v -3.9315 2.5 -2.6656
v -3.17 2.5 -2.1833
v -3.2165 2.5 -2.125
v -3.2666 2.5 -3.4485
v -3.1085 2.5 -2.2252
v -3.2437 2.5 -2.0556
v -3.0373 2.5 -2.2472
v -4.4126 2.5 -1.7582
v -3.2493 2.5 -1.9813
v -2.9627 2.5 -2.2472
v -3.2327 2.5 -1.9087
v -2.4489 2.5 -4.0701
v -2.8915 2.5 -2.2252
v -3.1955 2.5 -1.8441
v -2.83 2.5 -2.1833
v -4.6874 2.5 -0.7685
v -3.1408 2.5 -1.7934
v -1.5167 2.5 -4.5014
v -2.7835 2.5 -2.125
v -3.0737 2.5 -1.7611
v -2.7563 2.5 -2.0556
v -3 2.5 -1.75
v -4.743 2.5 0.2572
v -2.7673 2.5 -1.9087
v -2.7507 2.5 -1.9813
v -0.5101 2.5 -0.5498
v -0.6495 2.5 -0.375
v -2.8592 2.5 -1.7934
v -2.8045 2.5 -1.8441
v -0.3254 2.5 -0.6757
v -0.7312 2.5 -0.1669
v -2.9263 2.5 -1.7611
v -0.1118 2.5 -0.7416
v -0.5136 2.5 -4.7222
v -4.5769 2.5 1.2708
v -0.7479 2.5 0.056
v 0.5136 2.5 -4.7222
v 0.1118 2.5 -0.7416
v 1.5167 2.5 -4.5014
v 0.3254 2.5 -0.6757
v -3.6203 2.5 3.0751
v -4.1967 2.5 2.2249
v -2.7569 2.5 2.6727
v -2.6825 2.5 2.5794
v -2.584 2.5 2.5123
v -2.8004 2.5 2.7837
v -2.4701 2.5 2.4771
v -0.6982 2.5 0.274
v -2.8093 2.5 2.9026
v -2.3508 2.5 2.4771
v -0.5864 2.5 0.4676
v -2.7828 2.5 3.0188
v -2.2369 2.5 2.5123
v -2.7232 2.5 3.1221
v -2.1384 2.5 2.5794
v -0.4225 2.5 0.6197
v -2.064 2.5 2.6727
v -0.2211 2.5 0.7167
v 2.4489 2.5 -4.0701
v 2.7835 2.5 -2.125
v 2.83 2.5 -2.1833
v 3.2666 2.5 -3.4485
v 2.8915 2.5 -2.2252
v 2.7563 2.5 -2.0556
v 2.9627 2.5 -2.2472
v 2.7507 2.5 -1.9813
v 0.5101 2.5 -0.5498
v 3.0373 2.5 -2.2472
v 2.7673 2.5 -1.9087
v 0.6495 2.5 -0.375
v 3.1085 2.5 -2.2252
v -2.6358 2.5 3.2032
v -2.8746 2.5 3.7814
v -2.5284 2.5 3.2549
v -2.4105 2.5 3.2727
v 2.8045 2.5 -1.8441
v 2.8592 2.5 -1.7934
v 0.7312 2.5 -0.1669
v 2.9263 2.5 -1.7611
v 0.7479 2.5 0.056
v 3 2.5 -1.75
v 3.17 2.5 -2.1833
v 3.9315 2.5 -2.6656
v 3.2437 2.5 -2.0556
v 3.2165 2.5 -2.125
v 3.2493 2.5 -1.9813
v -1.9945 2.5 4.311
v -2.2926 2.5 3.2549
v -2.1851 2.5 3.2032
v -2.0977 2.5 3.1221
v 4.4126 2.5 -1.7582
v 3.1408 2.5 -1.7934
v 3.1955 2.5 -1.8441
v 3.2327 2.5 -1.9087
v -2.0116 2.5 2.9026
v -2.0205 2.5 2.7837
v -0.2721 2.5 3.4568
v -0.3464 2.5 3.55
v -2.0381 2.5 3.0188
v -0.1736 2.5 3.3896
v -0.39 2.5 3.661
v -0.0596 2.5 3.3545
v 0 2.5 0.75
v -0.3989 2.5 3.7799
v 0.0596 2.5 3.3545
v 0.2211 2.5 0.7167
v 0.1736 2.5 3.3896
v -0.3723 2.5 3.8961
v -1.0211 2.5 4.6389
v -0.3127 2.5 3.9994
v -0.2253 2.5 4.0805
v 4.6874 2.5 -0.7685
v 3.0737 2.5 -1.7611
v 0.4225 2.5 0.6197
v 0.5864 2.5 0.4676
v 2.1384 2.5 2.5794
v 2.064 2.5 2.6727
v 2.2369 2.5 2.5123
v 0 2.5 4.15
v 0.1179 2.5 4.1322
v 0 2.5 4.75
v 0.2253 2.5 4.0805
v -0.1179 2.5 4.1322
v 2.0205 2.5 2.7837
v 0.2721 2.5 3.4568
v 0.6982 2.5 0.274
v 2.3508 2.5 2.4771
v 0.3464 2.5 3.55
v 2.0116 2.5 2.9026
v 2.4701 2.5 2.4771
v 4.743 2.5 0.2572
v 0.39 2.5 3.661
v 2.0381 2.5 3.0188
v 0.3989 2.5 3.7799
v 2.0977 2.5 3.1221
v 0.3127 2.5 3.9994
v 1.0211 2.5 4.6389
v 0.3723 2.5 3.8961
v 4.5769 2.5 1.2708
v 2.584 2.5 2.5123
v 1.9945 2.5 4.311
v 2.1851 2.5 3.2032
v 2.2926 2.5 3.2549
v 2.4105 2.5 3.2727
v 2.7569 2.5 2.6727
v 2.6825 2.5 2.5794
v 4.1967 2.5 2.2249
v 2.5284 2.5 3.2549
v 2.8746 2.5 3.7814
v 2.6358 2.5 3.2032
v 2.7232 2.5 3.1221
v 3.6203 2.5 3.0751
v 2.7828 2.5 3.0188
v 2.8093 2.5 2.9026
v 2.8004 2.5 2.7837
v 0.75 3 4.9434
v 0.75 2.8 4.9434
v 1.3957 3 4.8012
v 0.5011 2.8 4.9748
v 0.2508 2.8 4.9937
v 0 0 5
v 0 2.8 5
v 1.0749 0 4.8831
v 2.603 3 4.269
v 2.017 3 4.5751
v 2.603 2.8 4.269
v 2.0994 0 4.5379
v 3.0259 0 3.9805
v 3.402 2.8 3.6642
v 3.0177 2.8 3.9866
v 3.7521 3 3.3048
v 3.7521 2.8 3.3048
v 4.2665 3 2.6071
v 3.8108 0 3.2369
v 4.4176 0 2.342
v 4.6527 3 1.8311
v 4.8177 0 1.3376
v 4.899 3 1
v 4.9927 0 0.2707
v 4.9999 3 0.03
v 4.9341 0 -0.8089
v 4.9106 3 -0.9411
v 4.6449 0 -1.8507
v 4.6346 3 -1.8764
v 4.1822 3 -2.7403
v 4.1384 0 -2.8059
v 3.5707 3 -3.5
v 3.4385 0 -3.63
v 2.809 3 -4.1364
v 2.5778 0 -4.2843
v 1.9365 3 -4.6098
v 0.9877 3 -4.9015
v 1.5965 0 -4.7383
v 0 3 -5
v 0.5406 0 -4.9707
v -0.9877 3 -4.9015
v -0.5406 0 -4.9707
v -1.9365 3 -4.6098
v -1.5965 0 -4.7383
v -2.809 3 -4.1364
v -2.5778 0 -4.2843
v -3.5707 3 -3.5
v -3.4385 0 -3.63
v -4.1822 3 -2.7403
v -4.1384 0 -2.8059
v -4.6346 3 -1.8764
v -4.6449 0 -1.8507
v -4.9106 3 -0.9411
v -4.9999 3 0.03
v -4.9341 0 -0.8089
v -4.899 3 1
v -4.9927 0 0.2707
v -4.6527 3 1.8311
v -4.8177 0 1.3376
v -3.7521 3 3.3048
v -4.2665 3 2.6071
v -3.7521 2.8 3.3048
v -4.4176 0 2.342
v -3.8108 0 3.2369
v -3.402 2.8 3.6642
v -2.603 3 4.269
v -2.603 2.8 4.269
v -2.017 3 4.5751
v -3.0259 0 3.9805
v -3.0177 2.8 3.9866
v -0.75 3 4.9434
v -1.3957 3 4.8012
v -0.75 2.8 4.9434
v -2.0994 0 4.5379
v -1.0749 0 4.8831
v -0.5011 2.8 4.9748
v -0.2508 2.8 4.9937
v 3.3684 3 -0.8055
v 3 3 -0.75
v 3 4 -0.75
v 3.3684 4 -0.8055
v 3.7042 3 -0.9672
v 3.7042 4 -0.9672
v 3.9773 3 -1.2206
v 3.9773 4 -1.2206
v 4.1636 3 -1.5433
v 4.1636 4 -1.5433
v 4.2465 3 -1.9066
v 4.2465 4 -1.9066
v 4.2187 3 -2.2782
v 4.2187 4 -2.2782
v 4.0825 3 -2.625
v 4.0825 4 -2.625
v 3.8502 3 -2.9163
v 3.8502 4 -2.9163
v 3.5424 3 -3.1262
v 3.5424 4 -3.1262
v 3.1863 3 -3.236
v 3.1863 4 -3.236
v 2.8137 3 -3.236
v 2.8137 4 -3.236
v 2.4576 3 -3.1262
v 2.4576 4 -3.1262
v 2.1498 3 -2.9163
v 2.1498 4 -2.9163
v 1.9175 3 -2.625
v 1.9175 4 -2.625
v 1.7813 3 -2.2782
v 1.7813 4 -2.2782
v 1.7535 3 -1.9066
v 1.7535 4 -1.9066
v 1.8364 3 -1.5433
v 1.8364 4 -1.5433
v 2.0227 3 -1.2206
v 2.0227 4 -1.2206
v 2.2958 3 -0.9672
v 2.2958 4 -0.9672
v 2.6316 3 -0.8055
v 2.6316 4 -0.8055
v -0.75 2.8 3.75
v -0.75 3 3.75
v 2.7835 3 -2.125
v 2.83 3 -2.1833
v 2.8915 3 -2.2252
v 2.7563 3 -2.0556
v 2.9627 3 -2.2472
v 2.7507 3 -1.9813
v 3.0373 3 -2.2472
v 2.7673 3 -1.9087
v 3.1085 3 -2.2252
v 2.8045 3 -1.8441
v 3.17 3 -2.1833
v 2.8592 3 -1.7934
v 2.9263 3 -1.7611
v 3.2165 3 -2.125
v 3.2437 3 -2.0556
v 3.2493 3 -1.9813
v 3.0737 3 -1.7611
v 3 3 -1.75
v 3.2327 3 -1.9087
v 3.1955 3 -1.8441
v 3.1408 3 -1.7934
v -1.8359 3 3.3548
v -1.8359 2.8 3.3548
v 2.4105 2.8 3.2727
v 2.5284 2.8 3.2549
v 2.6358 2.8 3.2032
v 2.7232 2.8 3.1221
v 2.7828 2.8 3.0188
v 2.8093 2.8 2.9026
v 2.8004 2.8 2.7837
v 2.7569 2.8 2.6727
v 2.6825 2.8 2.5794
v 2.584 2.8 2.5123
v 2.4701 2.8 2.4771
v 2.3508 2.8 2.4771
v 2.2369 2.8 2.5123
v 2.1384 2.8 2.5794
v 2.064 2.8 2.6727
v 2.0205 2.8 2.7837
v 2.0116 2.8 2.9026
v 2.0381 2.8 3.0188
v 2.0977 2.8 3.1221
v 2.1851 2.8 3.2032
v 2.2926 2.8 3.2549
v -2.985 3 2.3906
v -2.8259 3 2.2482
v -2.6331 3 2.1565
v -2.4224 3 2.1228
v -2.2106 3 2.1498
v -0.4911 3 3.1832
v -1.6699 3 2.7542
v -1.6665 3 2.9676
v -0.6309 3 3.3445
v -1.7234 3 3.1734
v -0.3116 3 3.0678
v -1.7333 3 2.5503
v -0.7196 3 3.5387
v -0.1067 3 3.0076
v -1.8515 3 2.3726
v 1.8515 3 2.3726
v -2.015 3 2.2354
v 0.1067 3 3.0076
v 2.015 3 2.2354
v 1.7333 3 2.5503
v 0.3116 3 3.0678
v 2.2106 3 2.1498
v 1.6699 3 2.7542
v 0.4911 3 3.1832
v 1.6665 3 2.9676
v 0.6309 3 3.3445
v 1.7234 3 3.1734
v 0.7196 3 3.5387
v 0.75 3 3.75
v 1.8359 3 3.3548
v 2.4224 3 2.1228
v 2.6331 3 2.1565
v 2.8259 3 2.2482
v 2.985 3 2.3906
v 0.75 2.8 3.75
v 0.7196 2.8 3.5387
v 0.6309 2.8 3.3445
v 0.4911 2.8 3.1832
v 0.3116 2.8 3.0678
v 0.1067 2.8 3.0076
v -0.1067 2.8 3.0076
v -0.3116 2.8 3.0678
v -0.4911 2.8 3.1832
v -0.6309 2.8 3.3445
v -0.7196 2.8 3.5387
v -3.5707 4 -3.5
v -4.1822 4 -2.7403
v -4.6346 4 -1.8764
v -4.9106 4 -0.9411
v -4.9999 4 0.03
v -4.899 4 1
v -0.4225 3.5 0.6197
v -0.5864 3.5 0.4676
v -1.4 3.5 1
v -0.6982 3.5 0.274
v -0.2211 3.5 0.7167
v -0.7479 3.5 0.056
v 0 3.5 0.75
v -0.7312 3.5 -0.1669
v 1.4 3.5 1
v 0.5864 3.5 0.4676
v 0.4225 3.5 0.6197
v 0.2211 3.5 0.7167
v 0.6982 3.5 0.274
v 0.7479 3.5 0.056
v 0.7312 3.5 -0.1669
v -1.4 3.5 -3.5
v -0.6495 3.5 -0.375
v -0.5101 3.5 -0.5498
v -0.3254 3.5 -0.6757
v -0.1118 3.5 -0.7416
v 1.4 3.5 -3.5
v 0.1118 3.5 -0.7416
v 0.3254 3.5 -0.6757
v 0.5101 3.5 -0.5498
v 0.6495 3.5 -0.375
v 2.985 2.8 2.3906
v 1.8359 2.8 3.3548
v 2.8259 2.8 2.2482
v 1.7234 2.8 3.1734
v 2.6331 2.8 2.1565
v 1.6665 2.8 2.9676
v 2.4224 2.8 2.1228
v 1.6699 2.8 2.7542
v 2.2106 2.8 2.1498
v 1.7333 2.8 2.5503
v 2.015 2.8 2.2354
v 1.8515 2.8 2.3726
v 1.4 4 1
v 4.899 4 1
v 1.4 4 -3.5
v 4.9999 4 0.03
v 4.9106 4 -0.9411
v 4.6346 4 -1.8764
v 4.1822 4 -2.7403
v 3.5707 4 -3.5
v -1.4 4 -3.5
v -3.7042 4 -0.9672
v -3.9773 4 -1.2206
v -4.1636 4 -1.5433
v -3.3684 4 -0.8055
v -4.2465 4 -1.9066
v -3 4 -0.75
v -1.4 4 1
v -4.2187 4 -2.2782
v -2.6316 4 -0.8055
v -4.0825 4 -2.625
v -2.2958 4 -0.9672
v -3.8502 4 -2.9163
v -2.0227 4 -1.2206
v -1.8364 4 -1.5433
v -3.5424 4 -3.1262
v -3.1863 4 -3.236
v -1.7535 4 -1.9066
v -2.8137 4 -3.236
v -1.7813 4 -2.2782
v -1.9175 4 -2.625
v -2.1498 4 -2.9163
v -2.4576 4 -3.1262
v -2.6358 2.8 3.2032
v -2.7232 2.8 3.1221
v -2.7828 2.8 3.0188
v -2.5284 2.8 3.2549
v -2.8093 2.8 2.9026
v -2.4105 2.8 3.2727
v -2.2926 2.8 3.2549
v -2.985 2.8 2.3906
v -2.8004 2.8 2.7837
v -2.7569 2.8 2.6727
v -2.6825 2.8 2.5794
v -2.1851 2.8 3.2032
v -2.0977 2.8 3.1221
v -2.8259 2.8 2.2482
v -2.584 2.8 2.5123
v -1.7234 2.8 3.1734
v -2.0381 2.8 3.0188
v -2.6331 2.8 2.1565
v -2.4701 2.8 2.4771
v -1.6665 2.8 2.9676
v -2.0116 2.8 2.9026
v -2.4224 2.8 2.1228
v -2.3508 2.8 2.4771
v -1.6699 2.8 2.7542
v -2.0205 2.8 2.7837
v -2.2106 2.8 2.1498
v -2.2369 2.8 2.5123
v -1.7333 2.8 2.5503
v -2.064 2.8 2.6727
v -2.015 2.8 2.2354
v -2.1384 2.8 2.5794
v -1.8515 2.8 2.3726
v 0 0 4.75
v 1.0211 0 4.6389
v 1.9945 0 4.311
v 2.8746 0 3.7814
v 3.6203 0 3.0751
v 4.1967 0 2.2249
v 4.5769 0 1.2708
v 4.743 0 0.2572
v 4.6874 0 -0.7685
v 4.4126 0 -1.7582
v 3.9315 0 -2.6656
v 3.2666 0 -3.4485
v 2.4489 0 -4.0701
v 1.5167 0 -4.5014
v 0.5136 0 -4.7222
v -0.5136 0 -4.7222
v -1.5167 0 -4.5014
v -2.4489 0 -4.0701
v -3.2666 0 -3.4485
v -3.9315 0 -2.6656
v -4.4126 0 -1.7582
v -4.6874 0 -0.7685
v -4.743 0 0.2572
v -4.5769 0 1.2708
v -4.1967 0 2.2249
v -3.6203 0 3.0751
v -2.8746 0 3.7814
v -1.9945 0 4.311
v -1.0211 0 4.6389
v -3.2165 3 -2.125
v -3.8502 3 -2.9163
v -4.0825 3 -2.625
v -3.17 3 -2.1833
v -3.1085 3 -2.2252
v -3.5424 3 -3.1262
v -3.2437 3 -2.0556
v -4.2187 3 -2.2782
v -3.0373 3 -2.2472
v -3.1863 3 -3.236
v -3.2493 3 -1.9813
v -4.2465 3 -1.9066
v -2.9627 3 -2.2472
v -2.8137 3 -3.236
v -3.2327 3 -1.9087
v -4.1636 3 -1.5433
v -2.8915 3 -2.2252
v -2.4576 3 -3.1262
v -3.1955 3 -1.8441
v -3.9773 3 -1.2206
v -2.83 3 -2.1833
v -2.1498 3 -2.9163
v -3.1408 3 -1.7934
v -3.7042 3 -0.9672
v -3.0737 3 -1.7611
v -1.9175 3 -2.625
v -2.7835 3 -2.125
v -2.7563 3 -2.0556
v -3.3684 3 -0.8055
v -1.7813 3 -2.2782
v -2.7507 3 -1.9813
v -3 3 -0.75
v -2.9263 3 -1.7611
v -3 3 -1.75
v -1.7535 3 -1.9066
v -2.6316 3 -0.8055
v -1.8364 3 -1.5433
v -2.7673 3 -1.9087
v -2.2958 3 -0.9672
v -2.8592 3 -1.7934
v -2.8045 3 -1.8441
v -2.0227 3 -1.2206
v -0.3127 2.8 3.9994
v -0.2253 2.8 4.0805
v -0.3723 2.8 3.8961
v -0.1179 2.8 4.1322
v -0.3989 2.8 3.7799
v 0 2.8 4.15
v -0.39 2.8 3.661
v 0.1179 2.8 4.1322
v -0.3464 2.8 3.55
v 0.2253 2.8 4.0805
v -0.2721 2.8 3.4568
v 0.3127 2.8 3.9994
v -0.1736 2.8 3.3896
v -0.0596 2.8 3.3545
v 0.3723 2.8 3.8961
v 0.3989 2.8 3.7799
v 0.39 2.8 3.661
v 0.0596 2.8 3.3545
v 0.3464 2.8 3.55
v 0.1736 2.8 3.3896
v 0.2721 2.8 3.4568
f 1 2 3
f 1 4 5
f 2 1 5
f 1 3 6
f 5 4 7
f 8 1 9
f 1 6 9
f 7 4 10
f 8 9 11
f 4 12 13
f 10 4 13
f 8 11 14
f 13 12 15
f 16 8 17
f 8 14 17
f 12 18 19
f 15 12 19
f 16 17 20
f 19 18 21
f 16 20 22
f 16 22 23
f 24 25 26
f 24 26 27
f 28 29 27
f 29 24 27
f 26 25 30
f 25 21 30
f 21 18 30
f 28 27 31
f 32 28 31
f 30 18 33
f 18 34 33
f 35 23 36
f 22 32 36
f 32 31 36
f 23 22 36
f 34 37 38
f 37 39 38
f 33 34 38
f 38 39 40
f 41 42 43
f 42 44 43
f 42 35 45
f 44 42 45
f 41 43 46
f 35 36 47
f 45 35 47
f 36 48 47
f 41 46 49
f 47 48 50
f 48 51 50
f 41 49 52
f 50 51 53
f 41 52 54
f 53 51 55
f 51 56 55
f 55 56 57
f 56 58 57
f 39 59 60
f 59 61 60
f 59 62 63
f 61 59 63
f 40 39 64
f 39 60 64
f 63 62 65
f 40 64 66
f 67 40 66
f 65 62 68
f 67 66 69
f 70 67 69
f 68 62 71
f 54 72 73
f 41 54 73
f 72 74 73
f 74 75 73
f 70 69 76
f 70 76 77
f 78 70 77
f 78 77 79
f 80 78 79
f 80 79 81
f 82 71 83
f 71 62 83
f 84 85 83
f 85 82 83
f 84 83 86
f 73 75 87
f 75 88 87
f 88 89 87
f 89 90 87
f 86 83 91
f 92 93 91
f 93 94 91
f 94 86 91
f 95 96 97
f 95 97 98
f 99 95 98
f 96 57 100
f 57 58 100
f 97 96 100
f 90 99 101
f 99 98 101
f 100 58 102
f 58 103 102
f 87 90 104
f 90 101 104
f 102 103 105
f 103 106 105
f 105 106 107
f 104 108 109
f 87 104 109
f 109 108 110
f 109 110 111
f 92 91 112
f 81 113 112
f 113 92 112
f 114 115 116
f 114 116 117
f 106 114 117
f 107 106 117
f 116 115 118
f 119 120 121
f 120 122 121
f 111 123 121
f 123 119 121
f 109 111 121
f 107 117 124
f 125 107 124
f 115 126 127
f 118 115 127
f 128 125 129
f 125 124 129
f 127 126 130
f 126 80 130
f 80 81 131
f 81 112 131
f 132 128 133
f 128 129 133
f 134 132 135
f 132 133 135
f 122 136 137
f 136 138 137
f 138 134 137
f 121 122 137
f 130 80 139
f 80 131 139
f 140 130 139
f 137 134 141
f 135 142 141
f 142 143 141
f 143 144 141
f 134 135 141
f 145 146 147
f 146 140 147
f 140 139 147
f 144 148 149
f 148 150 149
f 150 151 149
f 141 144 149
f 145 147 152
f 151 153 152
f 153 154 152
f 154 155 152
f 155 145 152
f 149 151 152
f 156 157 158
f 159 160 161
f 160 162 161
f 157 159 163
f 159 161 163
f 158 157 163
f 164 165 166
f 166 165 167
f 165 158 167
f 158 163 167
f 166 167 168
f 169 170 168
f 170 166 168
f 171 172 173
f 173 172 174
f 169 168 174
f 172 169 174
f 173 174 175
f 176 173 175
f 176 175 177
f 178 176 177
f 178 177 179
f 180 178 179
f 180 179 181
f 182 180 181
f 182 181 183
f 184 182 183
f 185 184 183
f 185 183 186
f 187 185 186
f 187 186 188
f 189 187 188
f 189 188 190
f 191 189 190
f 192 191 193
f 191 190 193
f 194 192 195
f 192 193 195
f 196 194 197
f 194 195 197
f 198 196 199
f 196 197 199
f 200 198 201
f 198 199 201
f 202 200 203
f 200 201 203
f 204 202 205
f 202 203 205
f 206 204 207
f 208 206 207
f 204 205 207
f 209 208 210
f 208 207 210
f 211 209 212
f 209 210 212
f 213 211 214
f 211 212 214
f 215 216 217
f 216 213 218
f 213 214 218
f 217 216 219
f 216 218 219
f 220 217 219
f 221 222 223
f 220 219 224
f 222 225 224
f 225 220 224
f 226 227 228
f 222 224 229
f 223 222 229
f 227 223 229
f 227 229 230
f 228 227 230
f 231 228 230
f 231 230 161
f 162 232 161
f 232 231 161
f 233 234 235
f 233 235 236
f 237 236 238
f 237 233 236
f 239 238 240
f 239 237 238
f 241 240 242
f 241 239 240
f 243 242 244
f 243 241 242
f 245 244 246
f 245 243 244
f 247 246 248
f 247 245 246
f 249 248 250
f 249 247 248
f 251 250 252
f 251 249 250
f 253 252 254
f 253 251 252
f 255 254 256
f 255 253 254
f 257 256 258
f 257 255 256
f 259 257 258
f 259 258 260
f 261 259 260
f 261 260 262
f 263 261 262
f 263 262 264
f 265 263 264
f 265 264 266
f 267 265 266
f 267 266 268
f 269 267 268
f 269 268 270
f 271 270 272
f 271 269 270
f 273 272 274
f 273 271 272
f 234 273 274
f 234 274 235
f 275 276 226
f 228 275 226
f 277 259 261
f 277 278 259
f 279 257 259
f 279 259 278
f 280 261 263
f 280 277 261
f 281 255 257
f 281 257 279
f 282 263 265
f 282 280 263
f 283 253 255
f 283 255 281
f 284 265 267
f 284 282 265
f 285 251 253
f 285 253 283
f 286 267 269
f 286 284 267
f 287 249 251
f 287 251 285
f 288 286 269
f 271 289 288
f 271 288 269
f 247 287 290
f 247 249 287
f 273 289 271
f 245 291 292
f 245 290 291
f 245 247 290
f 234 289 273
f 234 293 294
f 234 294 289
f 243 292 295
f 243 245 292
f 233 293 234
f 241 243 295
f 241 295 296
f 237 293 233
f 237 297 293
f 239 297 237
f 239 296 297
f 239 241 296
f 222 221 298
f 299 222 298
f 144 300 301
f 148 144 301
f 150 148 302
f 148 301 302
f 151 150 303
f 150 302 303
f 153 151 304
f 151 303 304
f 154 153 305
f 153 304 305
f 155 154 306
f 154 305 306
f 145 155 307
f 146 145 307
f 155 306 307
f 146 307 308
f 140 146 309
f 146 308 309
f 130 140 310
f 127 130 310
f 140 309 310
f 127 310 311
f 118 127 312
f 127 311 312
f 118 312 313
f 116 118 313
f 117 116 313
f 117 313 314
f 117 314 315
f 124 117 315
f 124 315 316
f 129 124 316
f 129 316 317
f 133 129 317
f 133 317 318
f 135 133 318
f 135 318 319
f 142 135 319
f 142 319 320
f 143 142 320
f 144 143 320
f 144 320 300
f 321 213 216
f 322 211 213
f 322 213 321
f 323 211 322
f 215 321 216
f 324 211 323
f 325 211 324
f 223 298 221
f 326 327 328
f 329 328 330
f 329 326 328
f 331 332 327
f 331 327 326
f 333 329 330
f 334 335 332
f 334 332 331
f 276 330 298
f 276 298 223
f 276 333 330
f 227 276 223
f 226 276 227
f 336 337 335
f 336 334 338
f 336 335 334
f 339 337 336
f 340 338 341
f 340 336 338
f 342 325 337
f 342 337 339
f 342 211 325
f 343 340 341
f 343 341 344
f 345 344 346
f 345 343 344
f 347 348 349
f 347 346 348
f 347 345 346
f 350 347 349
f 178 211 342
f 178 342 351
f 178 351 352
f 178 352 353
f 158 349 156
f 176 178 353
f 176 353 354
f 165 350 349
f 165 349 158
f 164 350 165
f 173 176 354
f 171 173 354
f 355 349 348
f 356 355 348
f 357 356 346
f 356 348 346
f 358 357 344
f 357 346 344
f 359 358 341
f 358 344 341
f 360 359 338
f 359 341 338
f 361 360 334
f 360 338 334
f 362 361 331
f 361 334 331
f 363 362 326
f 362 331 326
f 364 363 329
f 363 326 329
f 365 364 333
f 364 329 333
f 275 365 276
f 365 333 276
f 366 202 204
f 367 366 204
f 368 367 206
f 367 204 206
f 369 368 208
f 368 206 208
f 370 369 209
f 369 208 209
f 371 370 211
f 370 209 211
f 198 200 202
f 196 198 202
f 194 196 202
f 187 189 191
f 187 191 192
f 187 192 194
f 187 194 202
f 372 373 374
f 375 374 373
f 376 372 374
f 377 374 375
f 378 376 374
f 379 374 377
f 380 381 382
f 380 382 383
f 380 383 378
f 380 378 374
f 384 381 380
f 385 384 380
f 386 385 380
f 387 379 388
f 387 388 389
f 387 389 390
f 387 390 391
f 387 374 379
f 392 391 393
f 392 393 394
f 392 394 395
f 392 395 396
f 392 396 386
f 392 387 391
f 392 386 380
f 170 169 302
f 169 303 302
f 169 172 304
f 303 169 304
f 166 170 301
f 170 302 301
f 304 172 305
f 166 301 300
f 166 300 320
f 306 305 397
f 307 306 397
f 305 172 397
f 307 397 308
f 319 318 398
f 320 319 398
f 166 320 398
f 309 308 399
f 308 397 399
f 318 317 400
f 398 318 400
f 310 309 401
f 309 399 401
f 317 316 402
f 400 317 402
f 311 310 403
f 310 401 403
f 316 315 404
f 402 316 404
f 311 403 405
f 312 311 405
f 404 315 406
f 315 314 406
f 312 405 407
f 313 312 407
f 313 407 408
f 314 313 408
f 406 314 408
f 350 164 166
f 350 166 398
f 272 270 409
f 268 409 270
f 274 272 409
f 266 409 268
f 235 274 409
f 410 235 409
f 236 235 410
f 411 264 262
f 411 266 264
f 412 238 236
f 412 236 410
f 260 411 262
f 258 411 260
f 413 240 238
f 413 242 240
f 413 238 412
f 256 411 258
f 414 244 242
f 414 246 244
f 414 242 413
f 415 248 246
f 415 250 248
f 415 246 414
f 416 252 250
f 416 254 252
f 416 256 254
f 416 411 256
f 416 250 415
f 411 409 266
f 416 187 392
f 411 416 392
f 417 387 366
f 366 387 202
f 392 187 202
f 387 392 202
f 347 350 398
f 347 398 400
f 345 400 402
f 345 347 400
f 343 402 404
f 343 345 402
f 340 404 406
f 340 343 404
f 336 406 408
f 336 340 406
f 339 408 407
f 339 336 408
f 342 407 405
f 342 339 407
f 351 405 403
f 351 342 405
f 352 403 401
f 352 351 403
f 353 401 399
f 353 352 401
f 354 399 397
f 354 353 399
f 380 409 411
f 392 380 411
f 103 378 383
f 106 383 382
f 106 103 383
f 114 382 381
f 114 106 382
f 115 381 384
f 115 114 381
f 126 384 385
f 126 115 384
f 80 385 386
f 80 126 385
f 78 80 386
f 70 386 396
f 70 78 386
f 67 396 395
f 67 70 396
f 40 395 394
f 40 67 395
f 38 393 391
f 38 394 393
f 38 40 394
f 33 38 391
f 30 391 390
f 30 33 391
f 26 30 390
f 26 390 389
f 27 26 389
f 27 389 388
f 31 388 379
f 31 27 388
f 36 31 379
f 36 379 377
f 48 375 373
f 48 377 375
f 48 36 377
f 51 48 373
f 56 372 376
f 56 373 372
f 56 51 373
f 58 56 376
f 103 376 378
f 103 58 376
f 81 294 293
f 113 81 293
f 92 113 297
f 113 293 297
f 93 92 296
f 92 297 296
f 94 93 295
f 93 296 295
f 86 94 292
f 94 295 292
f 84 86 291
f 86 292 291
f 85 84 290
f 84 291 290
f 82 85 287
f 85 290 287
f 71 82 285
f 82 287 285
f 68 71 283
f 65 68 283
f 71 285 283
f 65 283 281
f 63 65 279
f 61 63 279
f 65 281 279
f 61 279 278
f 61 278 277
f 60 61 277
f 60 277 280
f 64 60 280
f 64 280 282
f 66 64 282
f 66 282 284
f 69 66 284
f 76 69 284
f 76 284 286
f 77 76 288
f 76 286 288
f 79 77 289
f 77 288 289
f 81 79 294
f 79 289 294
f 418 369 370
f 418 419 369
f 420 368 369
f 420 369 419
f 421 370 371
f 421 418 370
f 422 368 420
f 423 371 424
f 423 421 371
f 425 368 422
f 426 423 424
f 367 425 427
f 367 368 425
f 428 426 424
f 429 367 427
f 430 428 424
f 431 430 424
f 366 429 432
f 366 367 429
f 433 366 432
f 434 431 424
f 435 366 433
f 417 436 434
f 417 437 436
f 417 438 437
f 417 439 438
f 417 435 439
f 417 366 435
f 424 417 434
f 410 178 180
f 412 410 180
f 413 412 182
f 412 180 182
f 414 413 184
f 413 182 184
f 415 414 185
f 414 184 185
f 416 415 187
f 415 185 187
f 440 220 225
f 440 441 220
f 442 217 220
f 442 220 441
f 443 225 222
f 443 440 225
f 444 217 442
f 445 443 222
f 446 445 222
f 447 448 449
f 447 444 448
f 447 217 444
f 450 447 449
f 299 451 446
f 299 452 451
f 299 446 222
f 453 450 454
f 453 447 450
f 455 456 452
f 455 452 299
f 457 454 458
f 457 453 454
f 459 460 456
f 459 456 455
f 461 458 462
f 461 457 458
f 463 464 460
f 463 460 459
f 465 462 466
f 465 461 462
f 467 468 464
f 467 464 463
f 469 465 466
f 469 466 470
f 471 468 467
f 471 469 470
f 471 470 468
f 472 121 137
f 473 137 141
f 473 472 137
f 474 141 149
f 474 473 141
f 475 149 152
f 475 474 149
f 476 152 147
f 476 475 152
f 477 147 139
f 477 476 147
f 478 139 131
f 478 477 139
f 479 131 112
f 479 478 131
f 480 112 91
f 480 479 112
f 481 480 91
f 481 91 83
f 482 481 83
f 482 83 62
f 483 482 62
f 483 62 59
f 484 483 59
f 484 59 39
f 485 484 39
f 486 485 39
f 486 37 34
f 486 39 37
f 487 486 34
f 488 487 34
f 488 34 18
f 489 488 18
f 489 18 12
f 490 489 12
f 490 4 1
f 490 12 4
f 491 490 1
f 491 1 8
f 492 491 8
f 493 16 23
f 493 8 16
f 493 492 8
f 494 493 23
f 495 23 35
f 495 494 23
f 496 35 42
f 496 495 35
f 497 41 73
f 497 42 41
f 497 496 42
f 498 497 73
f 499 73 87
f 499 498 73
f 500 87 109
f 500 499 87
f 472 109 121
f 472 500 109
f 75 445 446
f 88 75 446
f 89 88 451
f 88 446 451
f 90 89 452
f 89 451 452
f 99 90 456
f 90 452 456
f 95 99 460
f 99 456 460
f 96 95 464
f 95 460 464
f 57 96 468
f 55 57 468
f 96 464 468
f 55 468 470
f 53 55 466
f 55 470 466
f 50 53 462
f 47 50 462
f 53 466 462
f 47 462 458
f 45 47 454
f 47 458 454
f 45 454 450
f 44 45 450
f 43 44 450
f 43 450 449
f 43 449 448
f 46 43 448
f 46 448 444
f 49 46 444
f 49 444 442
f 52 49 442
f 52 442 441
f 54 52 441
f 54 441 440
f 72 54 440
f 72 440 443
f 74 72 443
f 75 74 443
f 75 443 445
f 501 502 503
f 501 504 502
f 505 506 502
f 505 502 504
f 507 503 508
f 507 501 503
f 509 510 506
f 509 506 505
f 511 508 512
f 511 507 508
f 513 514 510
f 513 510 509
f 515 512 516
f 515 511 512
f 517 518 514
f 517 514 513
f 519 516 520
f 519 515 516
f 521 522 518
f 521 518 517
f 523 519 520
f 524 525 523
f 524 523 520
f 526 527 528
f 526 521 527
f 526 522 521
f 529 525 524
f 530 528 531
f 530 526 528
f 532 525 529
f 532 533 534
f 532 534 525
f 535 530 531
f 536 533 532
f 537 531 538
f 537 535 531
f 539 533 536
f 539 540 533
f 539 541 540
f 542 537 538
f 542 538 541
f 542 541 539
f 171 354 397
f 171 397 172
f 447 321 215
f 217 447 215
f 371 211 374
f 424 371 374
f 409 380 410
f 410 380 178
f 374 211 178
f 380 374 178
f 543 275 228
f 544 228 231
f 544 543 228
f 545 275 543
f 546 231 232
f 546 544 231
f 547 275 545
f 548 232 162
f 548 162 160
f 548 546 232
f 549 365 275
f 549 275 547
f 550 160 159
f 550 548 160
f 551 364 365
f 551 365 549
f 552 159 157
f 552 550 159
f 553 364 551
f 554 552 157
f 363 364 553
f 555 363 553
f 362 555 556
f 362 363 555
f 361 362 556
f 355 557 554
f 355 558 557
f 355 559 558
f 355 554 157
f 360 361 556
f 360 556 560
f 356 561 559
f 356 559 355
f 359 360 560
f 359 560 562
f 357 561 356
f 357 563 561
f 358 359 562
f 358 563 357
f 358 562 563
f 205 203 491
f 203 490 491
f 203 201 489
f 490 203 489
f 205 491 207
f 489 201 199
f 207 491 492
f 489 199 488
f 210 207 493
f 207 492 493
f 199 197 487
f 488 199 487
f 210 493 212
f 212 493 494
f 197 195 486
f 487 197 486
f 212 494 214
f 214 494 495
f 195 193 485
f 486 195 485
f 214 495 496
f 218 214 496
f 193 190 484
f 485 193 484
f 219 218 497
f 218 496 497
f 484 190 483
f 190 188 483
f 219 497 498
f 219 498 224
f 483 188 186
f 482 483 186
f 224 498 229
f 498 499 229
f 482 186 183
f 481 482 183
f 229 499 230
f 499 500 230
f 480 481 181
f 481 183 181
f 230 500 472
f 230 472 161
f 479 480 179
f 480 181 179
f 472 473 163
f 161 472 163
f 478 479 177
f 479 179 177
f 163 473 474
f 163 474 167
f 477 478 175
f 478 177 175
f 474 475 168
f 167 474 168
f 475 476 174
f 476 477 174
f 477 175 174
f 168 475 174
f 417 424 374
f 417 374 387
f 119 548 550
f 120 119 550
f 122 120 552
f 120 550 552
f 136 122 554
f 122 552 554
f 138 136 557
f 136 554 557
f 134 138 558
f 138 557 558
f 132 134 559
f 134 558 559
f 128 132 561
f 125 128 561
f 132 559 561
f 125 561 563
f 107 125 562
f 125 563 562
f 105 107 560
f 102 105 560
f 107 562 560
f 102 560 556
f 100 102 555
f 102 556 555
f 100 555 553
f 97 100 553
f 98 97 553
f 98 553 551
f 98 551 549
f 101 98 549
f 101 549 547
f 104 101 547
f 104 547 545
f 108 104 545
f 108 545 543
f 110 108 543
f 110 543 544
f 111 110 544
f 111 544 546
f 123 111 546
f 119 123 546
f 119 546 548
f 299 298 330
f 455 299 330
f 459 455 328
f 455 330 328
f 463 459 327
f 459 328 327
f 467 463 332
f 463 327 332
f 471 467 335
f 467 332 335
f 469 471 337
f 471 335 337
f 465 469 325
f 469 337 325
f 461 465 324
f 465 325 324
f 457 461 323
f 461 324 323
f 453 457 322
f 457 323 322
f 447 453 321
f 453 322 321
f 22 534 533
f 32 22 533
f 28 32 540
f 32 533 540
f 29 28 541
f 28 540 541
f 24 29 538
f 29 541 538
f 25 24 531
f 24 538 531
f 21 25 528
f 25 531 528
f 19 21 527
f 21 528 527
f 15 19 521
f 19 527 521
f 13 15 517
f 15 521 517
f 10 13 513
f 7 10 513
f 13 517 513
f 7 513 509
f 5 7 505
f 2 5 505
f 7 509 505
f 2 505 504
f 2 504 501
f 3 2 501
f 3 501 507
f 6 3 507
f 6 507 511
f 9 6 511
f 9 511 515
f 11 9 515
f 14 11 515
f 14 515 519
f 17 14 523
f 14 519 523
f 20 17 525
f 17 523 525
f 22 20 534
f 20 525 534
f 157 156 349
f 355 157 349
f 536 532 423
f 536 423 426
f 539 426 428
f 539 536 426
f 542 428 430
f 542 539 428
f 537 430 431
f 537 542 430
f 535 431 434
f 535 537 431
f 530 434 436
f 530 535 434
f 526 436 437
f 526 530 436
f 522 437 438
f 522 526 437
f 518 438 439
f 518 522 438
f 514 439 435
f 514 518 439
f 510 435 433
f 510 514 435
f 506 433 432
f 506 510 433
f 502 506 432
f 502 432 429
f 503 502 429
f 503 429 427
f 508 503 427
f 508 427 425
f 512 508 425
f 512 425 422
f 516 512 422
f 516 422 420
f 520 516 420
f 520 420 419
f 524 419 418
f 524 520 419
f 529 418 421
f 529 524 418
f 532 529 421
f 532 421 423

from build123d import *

# Parameters (mm, degrees)
SKETCH1_R           = 5
SKETCH1_R_2         = 4.75
BOSS_EXTRUDE1_DEPTH = 3
BOSS_EXTRUDE2_START = -0.5
SKETCH2_R           = 5
SKETCH2_R_2         = 0.75
BOSS_EXTRUDE2_DEPTH = 0.5
SKETCH3_R           = 0.75
SKETCH3_R_2         = 1.25
BOSS_EXTRUDE3_DEPTH = 1
SKETCH4_R           = 0.25
CUT_EXTRUDE1_DEPTH  = 0.5
SKETCH5_W           = 2.8
SKETCH5_H           = 4.5
CUT_EXTRUDE2_DEPTH  = 0.5
SKETCH6_R           = 0.4
CUT_EXTRUDE3_DEPTH  = 0.5
SKETCH7_R           = 0.4
CUT_EXTRUDE4_DEPTH  = 0.2


with BuildPart() as part:
    # Sketch1 → Boss-Extrude1 (new body)
    with BuildSketch(Plane(origin=(0, 0, 0), x_dir=(1, 0, 0), z_dir=(0, 1, 0))):
        with Locations(Location((0, 0, 0), (0, 0, 270))):
            Circle(SKETCH1_R)
        with Locations(Location((0, 0, 0), (0, 0, 270))):
            Circle(SKETCH1_R_2, mode=Mode.SUBTRACT)
    extrude(amount=BOSS_EXTRUDE1_DEPTH)

    # Sketch2 → Boss-Extrude2 (add)
    with BuildSketch(Plane(origin=(0, 3, 0), x_dir=(1, 0, 0), z_dir=(0, 1, 0)).offset(BOSS_EXTRUDE2_START)):
        with Locations(Location((0, 0, 0), (0, 0, 270))):
            Circle(SKETCH2_R)
        with Locations(Location((0, 0, 0), (0, 0, 270))):
            Circle(SKETCH2_R_2, mode=Mode.SUBTRACT)
    extrude(amount=BOSS_EXTRUDE2_DEPTH)

    # Sketch3 → Boss-Extrude3 (add)
    with BuildSketch(Plane(origin=(0, 3, 0), x_dir=(1, 0, 0), z_dir=(0, 1, 0))):
        with BuildLine():
            Line((-4.898979486, -1), (4.898979486, -1))
            ThreePointArc((4.898979486, -1), (4.795459086, 1.415475947), (3.570714214, 3.5))
            Line((3.570714214, 3.5), (-3.570714214, 3.5))
            ThreePointArc((-3.570714214, 3.5), (-4.795459086, 1.415475947), (-4.898979486, -1))
        make_face()
        with Locations(Location((0, 0, 0), (0, 0, 270))):
            Circle(SKETCH3_R, mode=Mode.SUBTRACT)
        with Locations(Location((3, 2, 0), (0, 0, 270))):
            Circle(SKETCH3_R_2, mode=Mode.SUBTRACT)
        with Locations(Location((-3, 2, 0), (0, 0, 270))):
            Circle(SKETCH3_R_2, mode=Mode.SUBTRACT)
    extrude(amount=BOSS_EXTRUDE3_DEPTH)

    # Sketch4 → Cut-Extrude1 (cut)
    with BuildSketch(Plane(origin=(0, 3, 0), x_dir=(1, 0, 0), z_dir=(0, 1, 0))):
        with Locations(Location((-3, 2, 0), (0, 0, 270))):
            Circle(SKETCH4_R)
        with Locations(Location((3, 2, 0), (0, 0, 270))):
            Circle(SKETCH4_R)
    extrude(amount=-CUT_EXTRUDE1_DEPTH, mode=Mode.SUBTRACT)

    # Sketch5 → Cut-Extrude2 (cut)
    with BuildSketch(Plane(origin=(0, 4, 0), x_dir=(1, 0, 0), z_dir=(0, 1, 0))):
        with Locations((0, 1.25)):
            Rectangle(SKETCH5_W, SKETCH5_H)
    extrude(amount=-CUT_EXTRUDE2_DEPTH, mode=Mode.SUBTRACT)

    # Sketch6 → Cut-Extrude3 (cut)
    with BuildSketch(Plane(origin=(0, 3, 0), x_dir=(1, 0, 0), z_dir=(0, 1, 0))):
        with Locations(Location((0, -3.75, 0), (0, 0, 270))):
            Circle(SKETCH6_R)
        with Locations(Location((2.410453536, -2.872666662, 0), (0, 0, 270))):
            Circle(SKETCH6_R)
        with Locations(Location((-2.410453536, -2.872666662, 0), (0, 0, 270))):
            Circle(SKETCH6_R)
    extrude(amount=-CUT_EXTRUDE3_DEPTH, mode=Mode.SUBTRACT)

    # Sketch7 → Cut-Extrude4 (cut)
    # profile 1 of 3: a face of its own
    with BuildSketch(Plane(origin=(0, 3, 0), x_dir=(1, 0, 0), z_dir=(0, 1, 0))):
        with BuildLine():
            Line((-0.75, -3.75), (-0.75, -5.45))
            Line((-0.75, -5.45), (0.75, -5.45))
            Line((0.75, -5.45), (0.75, -3.75))
            ThreePointArc((0.75, -3.75), (0, -3), (-0.75, -3.75))
        make_face()
        with Locations(Location((0, -3.75, 0), (0, 0, 270))):
            Circle(SKETCH7_R, mode=Mode.SUBTRACT)
    # profile 2 of 3: a face of its own
    with BuildSketch(Plane(origin=(0, 3, 0), x_dir=(1, 0, 0), z_dir=(0, 1, 0))):
        with BuildLine():
            Line((-2.92865914, -4.657032922), (-1.835920204, -3.354757369))
            ThreePointArc((-1.835920204, -3.354757369), (-1.928362829, -2.298133329), (-2.984986869, -2.390575954))
            Line((-2.984986869, -2.390575954), (-4.077725805, -3.692851508))
            Line((-4.077725805, -3.692851508), (-2.92865914, -4.657032922))
        make_face()
        with Locations(Location((-2.410453536, -2.872666662, 0), (0, 0, 270))):
            Circle(SKETCH7_R, mode=Mode.SUBTRACT)
    # profile 3 of 3: a face of its own
    with BuildSketch(Plane(origin=(0, 3, 0), x_dir=(1, 0, 0), z_dir=(0, 1, 0))):
        with BuildLine():
            Line((2.984986869, -2.390575954), (4.077725805, -3.692851508))
            Line((4.077725805, -3.692851508), (2.92865914, -4.657032922))
            Line((2.92865914, -4.657032922), (1.835920204, -3.354757369))
            ThreePointArc((1.835920204, -3.354757369), (1.928362829, -2.298133329), (2.984986869, -2.390575954))
        make_face()
        with Locations(Location((2.410453536, -2.872666662, 0), (0, 0, 270))):
            Circle(SKETCH7_R, mode=Mode.SUBTRACT)
    extrude(amount=-CUT_EXTRUDE4_DEPTH, mode=Mode.SUBTRACT)


solid = part.part
